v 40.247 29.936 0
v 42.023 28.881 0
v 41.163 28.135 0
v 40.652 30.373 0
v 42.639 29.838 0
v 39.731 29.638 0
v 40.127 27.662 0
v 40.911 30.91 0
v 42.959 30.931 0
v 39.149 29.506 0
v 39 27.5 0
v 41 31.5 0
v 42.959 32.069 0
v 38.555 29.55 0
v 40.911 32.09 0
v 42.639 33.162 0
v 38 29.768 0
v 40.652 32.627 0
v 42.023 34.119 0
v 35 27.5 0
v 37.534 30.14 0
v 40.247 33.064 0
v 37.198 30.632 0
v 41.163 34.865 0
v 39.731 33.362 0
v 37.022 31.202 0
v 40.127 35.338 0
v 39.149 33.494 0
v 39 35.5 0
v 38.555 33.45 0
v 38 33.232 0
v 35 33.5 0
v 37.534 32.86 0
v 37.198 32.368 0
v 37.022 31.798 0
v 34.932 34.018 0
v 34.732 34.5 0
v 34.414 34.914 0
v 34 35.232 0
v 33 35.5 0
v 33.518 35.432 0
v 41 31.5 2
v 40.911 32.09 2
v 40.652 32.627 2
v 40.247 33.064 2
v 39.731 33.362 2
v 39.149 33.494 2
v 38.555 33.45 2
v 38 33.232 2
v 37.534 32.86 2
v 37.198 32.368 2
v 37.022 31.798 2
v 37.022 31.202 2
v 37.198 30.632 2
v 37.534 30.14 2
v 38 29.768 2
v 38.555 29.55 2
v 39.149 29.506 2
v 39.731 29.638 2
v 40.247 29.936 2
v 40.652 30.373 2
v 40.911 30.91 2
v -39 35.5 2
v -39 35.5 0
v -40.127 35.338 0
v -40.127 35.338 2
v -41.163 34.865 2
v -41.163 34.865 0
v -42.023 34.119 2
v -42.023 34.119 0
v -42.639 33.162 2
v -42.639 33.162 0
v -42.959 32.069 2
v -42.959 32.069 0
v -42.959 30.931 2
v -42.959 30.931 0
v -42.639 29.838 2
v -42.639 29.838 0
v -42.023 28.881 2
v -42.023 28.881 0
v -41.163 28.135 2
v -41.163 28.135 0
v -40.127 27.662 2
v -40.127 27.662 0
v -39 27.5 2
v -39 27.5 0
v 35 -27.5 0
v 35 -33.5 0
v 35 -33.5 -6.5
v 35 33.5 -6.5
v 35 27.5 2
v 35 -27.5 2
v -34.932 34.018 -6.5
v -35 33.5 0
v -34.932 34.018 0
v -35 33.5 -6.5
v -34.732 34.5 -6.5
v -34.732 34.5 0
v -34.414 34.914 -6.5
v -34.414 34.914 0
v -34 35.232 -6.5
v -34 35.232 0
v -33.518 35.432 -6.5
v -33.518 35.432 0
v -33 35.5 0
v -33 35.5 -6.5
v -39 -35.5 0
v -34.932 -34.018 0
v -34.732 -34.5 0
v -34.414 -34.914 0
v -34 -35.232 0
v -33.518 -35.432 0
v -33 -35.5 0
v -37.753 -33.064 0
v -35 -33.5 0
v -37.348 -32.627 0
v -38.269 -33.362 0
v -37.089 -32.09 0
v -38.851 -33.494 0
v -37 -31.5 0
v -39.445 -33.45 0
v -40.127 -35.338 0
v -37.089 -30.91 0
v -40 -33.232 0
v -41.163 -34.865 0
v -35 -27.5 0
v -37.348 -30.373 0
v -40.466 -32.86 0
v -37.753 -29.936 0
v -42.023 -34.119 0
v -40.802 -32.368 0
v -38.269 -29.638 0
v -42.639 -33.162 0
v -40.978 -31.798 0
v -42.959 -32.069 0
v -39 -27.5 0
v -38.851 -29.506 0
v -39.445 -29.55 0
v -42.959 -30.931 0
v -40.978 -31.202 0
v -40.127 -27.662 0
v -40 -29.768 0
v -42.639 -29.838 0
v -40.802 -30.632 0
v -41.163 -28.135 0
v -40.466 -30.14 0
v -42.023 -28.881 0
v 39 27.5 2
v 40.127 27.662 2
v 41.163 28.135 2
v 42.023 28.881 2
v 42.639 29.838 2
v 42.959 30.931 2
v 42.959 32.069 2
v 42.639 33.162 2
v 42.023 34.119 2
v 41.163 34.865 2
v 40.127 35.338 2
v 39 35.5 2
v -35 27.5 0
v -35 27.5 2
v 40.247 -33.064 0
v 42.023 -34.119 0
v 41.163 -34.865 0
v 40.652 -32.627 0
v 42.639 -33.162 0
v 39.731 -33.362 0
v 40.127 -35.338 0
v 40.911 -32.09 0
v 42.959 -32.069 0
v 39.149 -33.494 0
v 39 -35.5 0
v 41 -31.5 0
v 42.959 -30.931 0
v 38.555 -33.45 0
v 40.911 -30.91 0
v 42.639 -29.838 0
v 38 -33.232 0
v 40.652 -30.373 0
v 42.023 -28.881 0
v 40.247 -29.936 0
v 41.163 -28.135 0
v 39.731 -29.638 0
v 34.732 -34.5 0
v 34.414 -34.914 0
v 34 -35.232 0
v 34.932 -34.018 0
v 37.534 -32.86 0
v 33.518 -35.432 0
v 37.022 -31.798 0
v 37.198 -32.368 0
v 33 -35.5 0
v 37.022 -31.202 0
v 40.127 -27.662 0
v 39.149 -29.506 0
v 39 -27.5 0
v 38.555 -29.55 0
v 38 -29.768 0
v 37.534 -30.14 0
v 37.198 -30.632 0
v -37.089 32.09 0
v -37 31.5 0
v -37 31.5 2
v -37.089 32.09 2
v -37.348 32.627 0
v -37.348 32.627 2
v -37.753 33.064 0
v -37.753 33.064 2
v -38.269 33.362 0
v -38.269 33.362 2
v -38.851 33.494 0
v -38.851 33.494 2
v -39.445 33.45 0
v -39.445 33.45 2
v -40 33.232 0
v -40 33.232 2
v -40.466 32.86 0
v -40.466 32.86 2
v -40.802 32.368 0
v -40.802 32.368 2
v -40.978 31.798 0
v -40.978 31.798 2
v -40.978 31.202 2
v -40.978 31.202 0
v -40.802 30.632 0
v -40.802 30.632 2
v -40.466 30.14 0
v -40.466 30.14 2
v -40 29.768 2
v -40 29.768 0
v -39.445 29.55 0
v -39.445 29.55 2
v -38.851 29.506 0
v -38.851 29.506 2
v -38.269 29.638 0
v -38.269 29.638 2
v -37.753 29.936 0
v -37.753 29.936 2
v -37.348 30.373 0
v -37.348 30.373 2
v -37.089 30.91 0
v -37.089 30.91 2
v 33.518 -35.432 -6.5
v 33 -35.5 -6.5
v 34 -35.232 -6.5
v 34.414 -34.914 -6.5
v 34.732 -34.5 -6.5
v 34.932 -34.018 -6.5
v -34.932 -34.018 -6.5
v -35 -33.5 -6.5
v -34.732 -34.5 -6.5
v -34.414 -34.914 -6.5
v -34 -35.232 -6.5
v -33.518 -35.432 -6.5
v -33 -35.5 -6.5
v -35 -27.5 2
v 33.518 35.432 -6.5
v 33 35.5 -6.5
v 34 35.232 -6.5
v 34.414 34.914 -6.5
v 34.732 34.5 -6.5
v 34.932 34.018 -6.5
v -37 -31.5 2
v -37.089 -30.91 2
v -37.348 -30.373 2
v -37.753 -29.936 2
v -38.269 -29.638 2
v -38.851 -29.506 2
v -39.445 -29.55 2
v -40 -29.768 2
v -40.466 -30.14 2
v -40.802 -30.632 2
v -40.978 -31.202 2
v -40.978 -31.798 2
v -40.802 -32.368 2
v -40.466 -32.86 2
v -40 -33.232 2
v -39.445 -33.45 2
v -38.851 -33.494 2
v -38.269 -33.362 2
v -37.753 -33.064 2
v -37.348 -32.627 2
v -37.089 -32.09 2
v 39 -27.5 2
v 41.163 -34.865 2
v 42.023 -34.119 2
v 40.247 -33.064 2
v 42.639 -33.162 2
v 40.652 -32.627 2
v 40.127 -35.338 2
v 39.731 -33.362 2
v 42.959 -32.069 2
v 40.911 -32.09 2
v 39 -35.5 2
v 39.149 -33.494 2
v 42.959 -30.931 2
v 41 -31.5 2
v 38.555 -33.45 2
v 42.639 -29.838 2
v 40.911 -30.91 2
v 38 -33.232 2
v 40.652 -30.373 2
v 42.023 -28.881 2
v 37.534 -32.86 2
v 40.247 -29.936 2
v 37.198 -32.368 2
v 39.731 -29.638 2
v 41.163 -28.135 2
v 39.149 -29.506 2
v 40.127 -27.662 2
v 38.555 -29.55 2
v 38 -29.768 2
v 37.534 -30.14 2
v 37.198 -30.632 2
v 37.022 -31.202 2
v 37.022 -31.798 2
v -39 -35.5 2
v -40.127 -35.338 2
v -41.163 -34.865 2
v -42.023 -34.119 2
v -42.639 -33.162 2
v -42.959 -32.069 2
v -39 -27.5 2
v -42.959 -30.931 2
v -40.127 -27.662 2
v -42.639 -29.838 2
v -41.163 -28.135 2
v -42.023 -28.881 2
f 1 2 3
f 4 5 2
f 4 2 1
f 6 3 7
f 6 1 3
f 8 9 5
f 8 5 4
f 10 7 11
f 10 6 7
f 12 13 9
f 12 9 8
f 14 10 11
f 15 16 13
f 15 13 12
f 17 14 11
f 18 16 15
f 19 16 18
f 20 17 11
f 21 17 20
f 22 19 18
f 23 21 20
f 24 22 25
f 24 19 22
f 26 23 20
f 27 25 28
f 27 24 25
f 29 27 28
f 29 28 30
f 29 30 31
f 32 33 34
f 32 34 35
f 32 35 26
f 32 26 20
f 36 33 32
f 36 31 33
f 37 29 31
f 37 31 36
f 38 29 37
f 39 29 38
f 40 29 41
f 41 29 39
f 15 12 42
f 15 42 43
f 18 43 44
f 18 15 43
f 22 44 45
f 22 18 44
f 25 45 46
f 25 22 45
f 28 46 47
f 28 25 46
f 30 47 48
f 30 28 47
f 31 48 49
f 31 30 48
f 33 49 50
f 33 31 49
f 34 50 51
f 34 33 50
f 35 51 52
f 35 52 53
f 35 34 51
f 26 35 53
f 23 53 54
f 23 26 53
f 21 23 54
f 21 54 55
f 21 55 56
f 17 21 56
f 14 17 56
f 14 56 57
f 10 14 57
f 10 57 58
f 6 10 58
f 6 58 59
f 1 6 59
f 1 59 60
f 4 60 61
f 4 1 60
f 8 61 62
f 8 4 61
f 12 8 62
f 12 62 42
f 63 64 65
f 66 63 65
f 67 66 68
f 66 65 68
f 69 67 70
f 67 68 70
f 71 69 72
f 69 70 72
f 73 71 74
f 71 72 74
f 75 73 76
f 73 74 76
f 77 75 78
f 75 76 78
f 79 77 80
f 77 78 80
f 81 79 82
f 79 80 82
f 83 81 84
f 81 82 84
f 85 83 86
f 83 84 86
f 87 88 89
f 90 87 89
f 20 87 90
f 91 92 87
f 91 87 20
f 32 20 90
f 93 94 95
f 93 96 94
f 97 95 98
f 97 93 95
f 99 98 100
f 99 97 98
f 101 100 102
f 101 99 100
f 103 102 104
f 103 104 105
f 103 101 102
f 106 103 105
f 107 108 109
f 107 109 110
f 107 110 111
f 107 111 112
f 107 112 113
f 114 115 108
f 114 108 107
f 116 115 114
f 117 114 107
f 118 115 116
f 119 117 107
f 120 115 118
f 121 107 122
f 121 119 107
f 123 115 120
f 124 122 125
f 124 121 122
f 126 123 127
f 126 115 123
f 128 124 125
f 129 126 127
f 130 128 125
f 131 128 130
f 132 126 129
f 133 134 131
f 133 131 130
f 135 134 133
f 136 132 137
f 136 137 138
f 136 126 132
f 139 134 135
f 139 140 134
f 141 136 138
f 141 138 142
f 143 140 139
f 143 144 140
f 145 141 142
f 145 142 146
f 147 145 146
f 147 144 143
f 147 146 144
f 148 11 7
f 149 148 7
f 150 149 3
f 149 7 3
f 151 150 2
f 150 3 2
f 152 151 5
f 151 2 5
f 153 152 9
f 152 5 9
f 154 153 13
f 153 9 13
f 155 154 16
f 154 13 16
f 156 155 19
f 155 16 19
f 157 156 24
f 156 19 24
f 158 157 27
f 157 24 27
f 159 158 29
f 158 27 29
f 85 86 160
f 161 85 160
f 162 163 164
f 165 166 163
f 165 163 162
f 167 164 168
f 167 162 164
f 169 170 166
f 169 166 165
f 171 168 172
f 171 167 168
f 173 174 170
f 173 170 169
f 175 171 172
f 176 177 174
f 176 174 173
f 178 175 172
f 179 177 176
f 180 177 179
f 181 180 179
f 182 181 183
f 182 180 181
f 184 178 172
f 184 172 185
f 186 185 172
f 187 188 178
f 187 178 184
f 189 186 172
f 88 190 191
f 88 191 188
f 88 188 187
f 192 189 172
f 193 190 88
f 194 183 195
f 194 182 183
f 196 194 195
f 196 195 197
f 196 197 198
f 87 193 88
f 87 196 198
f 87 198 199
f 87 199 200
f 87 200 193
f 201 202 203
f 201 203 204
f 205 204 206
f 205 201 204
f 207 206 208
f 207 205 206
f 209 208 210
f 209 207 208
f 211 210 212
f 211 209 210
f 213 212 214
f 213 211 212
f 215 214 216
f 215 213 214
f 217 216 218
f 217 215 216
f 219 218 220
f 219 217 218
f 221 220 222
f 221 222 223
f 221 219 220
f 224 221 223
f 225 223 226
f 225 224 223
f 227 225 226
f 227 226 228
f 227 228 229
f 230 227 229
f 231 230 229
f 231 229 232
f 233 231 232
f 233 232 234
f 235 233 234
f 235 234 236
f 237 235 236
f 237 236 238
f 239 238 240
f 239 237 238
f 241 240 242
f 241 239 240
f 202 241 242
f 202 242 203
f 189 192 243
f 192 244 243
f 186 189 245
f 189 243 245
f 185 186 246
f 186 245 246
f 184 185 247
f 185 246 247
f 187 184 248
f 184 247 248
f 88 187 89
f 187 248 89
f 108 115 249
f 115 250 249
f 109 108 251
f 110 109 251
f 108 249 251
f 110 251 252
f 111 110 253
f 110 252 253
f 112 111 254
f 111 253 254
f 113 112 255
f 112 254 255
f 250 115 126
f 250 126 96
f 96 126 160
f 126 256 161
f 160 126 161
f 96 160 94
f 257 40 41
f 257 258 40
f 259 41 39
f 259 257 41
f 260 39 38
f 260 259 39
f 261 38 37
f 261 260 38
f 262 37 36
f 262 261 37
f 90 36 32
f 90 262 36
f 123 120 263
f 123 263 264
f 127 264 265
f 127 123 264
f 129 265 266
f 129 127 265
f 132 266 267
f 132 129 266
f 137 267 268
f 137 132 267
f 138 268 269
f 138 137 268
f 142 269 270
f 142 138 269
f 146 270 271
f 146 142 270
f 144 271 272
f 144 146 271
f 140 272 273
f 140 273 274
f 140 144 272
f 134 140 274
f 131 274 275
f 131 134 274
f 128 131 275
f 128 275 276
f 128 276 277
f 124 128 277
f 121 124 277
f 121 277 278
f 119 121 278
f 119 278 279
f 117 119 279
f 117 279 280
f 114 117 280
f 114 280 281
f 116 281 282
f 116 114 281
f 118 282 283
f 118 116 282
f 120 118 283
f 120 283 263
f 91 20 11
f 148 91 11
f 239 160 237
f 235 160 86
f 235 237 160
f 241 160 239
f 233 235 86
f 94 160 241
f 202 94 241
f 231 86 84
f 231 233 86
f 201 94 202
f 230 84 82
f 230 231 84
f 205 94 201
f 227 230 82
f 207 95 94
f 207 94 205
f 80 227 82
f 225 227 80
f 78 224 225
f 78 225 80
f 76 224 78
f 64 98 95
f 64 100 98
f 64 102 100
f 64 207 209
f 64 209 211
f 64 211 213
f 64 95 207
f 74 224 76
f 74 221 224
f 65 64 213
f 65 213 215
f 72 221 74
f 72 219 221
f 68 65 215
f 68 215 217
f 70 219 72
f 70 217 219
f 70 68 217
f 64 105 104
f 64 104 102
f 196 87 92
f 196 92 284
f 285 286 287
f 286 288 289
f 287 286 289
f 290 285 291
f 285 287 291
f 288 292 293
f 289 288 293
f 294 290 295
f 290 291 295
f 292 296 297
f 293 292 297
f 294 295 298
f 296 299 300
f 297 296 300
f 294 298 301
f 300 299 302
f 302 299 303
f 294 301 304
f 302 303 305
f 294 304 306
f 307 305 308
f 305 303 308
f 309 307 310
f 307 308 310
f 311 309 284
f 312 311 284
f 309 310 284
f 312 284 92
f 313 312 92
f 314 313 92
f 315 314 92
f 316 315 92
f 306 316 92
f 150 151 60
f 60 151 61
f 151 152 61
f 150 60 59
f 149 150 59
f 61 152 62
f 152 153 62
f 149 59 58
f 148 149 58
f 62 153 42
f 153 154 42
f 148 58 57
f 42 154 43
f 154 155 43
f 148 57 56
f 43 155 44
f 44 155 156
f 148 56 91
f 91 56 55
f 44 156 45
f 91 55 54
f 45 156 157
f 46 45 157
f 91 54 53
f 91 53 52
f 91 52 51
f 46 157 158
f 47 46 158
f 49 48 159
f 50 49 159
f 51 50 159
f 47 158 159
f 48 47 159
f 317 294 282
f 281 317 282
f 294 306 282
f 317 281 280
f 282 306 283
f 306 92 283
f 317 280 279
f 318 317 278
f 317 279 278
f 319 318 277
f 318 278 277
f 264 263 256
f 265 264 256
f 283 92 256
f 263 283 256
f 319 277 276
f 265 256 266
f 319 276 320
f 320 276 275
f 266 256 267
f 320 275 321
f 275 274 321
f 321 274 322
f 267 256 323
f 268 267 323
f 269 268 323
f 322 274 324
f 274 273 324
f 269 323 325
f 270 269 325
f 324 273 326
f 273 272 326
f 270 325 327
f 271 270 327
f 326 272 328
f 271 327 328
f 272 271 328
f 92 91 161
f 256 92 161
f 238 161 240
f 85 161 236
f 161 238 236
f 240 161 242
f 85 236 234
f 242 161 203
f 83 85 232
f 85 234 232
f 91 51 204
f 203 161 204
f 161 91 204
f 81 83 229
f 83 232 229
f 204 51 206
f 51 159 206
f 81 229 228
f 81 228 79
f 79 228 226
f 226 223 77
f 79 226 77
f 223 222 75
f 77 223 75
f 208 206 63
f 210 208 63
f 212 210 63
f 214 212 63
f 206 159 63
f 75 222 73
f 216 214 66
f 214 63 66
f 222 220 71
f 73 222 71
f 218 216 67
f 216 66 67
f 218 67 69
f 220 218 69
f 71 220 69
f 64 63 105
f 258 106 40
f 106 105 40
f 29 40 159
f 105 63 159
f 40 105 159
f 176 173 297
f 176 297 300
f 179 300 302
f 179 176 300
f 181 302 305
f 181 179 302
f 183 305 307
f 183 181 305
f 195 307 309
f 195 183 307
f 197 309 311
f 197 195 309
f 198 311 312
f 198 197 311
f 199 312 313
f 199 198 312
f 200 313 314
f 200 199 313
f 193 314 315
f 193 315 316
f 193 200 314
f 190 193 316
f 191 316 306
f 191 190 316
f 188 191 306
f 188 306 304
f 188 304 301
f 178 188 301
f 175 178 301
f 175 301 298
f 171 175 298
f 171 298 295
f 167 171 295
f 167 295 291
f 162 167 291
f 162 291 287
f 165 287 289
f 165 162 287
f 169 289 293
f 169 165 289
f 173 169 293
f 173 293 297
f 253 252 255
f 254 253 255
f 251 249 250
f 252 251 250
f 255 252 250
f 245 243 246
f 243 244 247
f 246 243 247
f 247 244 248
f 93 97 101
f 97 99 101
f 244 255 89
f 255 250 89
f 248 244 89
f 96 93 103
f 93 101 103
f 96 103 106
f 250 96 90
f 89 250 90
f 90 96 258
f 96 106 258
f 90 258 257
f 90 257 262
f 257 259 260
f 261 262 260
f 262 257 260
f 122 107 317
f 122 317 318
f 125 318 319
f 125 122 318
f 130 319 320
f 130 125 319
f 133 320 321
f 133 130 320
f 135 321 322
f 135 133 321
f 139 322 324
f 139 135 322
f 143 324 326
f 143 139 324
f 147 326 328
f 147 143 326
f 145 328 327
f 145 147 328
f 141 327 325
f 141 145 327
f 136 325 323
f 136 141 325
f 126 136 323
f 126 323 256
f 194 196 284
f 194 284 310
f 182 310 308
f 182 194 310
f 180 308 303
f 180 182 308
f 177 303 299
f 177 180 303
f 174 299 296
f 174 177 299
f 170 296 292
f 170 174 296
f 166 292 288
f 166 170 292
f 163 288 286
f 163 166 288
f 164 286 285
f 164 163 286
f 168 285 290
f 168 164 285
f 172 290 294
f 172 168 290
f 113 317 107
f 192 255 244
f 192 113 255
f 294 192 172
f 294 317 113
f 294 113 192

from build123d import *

# Parameters (mm, degrees)
SKETCH1_W           = 70
SKETCH1_H           = 55
SKETCH1_R           = 2
BOSS_EXTRUDE1_DEPTH = 2
SKETCH2_W           = 70
SKETCH2_H           = 71
BOSS_EXTRUDE2_DEPTH = 6.5
FILLET1_R           = 2


with BuildPart() as part:
    # Sketch1 → Boss-Extrude1 (new body)
    # profile 1 of 3: a face of its own
    with BuildSketch(Plane.XY):
        Rectangle(SKETCH1_W, SKETCH1_H)
    # profile 2 of 3: a face of its own
    with BuildSketch(Plane.XY):
        with BuildLine():
            Line((-39, 27.5), (39, 27.5))
            ThreePointArc((39, 27.5), (43, 31.5), (39, 35.5))
            Line((39, 35.5), (-39, 35.5))
            ThreePointArc((-39, 35.5), (-43, 31.5), (-39, 27.5))
        make_face()
        with Locations((-39, 31.5)):
            Circle(SKETCH1_R, mode=Mode.SUBTRACT)
        with Locations((39, 31.5)):
            Circle(SKETCH1_R, mode=Mode.SUBTRACT)
    # profile 3 of 3: a face of its own
    with BuildSketch(Plane.XY):
        with BuildLine():
            ThreePointArc((39, -27.5), (43, -31.5), (39, -35.5))
            Line((39, -35.5), (-39, -35.5))
            ThreePointArc((-39, -35.5), (-43, -31.5), (-39, -27.5))
            Line((-39, -27.5), (39, -27.5))
        make_face()
        with Locations((-39, -31.5)):
            Circle(SKETCH1_R, mode=Mode.SUBTRACT)
        with Locations((39, -31.5)):
            Circle(SKETCH1_R, mode=Mode.SUBTRACT)
    extrude(amount=BOSS_EXTRUDE1_DEPTH)

    # Sketch2 → Boss-Extrude2 (add)
    with BuildSketch(Plane.XY):
        Rectangle(SKETCH2_W, SKETCH2_H)
    extrude(amount=-BOSS_EXTRUDE2_DEPTH)

    # Fillet1
    fillet1_edges = [part.edges().sort_by_distance(p)[0] for p in [
        (35, 35.5, -3.25),
        (35, -35.5, -3.25),
        (-35, -35.5, -3.25),
        (-35, 35.5, -3.25),
    ]]
    fillet(fillet1_edges, radius=FILLET1_R)


solid = part.part
